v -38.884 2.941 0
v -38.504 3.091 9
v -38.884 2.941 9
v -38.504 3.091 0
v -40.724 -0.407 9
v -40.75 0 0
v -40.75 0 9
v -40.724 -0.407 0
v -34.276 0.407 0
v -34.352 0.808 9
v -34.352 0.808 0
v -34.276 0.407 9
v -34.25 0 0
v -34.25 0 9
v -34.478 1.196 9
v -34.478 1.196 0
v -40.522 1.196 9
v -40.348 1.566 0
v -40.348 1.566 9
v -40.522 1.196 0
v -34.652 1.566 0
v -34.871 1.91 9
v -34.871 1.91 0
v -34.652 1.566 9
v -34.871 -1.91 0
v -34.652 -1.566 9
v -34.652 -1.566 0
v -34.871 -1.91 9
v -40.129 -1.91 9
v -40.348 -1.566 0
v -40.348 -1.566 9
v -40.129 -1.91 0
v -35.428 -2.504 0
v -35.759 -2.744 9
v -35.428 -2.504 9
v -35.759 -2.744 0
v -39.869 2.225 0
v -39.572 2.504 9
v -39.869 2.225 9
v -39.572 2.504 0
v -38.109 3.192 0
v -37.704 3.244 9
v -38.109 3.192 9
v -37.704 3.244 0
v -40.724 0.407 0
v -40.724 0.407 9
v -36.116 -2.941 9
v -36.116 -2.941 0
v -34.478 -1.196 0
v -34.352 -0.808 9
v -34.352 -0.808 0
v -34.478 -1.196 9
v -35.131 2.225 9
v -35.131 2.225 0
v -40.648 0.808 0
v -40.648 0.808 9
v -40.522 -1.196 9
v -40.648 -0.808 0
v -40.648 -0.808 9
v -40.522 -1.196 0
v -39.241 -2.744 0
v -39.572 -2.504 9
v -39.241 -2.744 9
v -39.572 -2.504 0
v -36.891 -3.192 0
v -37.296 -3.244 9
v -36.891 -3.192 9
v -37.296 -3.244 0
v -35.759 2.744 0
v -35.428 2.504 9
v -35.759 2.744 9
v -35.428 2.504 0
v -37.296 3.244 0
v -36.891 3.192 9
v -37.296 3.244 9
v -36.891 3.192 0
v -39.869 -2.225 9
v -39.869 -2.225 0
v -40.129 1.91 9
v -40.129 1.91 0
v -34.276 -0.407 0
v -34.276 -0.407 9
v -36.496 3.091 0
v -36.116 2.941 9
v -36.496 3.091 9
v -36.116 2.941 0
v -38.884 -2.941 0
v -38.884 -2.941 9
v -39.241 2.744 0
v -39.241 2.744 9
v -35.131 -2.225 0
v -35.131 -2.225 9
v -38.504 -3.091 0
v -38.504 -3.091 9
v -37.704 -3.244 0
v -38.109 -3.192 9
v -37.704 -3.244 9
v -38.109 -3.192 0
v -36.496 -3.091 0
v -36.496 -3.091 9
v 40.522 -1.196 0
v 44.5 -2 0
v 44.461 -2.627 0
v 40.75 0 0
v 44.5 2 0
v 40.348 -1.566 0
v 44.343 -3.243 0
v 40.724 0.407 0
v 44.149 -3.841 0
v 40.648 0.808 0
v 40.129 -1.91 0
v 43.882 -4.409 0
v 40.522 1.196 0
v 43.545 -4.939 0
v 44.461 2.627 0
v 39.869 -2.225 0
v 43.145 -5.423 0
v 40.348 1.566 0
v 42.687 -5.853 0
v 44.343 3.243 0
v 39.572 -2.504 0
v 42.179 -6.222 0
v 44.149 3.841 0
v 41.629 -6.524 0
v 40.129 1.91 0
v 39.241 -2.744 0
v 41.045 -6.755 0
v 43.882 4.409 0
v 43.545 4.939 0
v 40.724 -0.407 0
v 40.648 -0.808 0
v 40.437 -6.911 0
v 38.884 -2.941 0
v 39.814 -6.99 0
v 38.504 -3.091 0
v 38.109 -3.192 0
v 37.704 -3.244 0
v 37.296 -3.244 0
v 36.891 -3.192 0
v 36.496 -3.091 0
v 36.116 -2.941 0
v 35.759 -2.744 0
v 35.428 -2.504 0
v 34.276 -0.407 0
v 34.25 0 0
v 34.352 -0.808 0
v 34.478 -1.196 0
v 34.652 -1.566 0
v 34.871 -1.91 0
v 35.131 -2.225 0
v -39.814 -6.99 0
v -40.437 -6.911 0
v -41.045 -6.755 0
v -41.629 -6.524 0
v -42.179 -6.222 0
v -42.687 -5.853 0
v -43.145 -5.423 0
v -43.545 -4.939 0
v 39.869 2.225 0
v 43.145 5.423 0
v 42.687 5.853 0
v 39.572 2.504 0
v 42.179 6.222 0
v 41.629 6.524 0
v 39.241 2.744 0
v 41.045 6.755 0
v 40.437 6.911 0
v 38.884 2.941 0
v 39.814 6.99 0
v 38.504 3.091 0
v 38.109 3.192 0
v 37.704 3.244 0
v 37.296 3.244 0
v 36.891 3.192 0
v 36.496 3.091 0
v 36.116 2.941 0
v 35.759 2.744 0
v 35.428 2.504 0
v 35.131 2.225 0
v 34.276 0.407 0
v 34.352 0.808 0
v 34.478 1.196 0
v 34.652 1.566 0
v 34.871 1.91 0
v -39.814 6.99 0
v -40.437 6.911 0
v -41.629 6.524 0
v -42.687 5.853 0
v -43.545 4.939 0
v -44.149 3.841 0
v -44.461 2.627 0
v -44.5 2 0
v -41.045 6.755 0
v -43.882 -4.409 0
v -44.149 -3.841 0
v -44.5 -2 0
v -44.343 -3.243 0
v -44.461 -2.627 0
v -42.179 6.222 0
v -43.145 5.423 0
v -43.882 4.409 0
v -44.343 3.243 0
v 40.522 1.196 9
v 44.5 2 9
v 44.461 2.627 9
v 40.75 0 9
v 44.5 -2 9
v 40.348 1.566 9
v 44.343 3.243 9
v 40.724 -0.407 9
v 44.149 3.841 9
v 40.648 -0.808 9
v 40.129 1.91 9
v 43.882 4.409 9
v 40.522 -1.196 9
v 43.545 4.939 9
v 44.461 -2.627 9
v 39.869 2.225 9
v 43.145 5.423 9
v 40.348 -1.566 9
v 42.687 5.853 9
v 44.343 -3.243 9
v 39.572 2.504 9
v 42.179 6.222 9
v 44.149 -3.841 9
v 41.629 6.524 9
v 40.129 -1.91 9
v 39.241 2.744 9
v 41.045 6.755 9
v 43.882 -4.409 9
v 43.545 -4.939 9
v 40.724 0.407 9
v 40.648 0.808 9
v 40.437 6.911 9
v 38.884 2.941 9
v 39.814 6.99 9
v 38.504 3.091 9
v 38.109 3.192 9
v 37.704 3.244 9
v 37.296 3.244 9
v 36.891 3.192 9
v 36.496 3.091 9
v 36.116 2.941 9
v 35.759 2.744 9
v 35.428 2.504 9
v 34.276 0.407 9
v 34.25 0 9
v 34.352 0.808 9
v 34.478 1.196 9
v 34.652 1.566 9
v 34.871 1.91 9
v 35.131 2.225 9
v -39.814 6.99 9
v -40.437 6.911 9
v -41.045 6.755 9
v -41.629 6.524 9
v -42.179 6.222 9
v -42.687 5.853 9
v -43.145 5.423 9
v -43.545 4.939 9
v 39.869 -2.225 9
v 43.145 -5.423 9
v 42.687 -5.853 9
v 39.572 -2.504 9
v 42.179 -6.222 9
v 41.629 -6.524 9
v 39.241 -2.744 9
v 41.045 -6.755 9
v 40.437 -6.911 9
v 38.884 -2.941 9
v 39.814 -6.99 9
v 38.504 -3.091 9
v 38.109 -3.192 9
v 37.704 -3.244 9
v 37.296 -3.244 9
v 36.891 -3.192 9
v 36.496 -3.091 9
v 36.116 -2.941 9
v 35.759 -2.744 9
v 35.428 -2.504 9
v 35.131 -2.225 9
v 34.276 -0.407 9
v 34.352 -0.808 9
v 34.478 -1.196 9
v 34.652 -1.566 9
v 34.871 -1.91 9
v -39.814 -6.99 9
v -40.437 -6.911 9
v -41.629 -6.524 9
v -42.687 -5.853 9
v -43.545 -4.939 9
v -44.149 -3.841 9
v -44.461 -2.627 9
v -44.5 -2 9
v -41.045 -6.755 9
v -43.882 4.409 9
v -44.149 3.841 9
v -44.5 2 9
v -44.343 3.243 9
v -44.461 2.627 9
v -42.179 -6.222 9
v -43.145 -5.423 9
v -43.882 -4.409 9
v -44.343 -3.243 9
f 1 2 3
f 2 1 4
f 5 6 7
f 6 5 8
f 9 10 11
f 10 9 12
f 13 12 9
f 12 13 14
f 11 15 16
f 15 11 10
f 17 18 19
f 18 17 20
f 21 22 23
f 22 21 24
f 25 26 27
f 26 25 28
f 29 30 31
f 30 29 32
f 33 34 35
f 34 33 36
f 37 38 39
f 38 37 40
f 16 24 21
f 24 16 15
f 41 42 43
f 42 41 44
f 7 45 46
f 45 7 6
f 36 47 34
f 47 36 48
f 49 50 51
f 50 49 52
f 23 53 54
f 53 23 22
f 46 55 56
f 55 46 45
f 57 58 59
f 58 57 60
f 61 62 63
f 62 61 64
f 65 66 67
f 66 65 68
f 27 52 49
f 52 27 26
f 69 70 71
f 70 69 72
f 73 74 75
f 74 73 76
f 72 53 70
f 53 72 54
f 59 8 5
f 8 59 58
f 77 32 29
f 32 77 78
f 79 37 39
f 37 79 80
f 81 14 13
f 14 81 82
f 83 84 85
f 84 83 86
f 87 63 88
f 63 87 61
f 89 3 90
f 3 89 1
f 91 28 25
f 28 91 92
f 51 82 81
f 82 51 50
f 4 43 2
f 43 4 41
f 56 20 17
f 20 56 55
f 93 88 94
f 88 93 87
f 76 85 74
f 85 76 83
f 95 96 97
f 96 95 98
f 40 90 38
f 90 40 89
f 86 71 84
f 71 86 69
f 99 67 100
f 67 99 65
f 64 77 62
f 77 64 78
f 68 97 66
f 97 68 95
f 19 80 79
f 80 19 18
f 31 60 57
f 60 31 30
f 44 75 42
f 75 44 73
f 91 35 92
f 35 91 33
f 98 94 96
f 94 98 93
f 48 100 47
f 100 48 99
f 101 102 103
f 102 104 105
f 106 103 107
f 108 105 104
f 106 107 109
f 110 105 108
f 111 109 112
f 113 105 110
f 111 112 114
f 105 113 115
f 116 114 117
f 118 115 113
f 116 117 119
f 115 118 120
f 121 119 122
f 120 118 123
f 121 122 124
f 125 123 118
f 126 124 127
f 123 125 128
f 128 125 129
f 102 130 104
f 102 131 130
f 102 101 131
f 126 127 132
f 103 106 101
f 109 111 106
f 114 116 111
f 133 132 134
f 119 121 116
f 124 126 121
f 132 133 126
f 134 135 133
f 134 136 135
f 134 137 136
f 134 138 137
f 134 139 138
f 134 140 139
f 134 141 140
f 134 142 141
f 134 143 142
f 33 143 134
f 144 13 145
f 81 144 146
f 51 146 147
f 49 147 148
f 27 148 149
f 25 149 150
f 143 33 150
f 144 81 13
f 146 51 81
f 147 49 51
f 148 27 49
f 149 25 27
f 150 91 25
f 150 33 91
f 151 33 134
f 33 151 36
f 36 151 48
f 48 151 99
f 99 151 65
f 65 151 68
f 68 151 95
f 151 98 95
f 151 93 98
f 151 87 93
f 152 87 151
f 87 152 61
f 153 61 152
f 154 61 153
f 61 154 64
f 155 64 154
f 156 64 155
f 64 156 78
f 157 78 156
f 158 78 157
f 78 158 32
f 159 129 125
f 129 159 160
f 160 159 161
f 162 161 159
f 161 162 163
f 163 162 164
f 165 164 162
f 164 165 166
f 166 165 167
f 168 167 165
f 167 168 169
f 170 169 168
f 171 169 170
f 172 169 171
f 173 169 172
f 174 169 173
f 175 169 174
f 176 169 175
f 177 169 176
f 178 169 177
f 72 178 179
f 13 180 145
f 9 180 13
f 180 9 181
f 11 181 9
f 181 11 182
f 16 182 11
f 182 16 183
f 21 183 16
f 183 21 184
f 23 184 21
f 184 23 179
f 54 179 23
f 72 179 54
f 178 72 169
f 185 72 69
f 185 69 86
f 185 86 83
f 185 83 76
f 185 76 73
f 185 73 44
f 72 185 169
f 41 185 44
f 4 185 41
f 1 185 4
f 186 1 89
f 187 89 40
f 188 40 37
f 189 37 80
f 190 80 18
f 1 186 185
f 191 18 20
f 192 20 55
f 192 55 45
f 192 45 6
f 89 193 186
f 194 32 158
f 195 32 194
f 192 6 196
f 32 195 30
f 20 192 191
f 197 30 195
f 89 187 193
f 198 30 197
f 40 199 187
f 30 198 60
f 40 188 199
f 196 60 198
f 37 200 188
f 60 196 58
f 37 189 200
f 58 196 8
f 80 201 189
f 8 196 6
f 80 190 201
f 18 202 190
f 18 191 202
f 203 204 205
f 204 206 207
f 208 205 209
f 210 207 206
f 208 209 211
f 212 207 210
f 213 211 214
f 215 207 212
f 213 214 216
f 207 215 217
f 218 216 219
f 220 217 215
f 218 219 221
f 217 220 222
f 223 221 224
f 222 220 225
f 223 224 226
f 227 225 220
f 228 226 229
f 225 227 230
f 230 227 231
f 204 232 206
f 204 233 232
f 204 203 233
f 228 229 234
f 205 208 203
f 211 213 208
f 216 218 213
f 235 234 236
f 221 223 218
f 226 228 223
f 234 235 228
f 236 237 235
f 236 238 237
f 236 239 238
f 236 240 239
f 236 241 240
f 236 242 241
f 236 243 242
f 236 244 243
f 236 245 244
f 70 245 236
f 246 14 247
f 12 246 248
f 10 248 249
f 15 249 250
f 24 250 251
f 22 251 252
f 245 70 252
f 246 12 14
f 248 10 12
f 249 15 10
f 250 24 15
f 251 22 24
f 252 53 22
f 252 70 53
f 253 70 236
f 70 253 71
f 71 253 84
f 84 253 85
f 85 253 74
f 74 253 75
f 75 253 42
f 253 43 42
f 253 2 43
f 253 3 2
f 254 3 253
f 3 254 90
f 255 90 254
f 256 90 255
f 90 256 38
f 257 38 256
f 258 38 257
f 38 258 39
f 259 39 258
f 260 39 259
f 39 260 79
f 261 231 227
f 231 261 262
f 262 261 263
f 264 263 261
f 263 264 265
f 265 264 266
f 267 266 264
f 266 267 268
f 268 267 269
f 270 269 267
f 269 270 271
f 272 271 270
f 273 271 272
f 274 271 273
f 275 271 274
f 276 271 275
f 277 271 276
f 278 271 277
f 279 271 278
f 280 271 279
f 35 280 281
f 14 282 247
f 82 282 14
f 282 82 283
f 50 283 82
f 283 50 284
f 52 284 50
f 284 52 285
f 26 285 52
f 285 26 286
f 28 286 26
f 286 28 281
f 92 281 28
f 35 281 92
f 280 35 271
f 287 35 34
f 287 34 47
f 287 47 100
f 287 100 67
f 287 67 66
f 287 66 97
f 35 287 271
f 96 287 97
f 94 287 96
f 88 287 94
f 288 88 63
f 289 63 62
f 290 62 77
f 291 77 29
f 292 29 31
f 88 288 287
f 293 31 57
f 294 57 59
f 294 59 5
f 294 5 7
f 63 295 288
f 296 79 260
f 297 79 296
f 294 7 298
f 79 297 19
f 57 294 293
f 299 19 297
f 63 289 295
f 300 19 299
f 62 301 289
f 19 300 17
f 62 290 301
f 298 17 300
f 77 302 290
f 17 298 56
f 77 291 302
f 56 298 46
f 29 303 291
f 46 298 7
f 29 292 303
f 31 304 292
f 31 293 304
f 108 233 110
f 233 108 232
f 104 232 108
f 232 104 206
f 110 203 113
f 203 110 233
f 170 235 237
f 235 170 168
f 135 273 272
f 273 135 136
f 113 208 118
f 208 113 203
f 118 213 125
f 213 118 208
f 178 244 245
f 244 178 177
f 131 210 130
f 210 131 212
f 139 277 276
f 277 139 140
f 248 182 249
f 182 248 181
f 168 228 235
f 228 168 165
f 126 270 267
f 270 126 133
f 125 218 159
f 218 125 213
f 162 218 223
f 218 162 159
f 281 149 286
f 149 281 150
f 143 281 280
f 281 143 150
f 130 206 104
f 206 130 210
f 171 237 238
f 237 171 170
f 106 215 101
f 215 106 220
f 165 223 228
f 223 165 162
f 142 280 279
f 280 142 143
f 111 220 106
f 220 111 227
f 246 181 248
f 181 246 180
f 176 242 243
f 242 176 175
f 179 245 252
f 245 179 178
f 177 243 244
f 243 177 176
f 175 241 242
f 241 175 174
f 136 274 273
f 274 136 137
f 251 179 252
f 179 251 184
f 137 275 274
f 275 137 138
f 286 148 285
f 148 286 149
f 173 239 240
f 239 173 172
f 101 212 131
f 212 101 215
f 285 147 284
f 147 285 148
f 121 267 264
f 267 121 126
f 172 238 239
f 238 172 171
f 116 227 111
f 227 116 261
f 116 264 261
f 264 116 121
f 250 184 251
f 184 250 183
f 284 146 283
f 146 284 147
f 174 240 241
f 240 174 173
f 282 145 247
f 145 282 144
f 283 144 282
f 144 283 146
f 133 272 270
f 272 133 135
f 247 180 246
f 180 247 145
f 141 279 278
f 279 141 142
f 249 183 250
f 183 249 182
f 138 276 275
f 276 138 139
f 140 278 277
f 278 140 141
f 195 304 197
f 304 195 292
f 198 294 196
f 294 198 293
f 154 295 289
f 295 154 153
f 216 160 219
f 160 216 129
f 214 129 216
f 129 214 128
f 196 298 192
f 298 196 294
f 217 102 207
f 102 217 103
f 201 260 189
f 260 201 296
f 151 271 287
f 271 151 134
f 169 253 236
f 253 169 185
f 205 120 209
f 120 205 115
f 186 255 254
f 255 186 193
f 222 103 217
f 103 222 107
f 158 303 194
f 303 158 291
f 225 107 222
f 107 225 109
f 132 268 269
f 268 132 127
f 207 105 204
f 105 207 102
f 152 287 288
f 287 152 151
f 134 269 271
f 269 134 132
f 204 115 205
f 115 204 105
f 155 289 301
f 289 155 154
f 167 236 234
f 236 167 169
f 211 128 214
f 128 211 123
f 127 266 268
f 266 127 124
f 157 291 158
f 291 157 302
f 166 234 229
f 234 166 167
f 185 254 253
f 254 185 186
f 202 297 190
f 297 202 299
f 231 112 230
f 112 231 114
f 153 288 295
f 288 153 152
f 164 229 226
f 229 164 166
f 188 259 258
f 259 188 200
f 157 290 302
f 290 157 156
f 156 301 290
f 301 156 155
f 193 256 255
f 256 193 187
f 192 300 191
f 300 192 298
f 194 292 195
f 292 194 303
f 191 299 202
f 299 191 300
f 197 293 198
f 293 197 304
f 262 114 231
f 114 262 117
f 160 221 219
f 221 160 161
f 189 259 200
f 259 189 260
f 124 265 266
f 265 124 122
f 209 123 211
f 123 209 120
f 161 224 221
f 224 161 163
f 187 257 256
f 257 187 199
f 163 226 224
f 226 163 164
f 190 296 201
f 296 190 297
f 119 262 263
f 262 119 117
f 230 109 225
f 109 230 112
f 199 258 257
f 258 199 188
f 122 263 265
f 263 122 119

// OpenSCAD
$fn = 50;


difference() {
	union() {
		hull() {
			translate(v = [-39.5000000000, 2.0000000000, 0]) {
				cylinder(h = 9, r = 5);
			}
			translate(v = [39.5000000000, 2.0000000000, 0]) {
				cylinder(h = 9, r = 5);
			}
			translate(v = [-39.5000000000, -2.0000000000, 0]) {
				cylinder(h = 9, r = 5);
			}
			translate(v = [39.5000000000, -2.0000000000, 0]) {
				cylinder(h = 9, r = 5);
			}
		}
	}
	union() {
		translate(v = [-37.5000000000, 0.0000000000, 0]) {
			cylinder(h = 9, r = 3.2500000000);
		}
		translate(v = [37.5000000000, 0.0000000000, 0]) {
			cylinder(h = 9, r = 3.2500000000);
		}
		translate(v = [-37.5000000000, 0.0000000000, 0]) {
			cylinder(h = 9, r = 1.8000000000);
		}
		translate(v = [37.5000000000, 0.0000000000, 0]) {
			cylinder(h = 9, r = 1.8000000000);
		}
		translate(v = [-37.5000000000, 0.0000000000, 0]) {
			cylinder(h = 9, r = 1.8000000000);
		}
		translate(v = [37.5000000000, 0.0000000000, 0]) {
			cylinder(h = 9, r = 1.8000000000);
		}
		translate(v = [-37.5000000000, 0.0000000000, 0]) {
			cylinder(h = 9, r = 1.8000000000);
		}
		translate(v = [37.5000000000, 0.0000000000, 0]) {
			cylinder(h = 9, r = 1.8000000000);
		}
	}
}
